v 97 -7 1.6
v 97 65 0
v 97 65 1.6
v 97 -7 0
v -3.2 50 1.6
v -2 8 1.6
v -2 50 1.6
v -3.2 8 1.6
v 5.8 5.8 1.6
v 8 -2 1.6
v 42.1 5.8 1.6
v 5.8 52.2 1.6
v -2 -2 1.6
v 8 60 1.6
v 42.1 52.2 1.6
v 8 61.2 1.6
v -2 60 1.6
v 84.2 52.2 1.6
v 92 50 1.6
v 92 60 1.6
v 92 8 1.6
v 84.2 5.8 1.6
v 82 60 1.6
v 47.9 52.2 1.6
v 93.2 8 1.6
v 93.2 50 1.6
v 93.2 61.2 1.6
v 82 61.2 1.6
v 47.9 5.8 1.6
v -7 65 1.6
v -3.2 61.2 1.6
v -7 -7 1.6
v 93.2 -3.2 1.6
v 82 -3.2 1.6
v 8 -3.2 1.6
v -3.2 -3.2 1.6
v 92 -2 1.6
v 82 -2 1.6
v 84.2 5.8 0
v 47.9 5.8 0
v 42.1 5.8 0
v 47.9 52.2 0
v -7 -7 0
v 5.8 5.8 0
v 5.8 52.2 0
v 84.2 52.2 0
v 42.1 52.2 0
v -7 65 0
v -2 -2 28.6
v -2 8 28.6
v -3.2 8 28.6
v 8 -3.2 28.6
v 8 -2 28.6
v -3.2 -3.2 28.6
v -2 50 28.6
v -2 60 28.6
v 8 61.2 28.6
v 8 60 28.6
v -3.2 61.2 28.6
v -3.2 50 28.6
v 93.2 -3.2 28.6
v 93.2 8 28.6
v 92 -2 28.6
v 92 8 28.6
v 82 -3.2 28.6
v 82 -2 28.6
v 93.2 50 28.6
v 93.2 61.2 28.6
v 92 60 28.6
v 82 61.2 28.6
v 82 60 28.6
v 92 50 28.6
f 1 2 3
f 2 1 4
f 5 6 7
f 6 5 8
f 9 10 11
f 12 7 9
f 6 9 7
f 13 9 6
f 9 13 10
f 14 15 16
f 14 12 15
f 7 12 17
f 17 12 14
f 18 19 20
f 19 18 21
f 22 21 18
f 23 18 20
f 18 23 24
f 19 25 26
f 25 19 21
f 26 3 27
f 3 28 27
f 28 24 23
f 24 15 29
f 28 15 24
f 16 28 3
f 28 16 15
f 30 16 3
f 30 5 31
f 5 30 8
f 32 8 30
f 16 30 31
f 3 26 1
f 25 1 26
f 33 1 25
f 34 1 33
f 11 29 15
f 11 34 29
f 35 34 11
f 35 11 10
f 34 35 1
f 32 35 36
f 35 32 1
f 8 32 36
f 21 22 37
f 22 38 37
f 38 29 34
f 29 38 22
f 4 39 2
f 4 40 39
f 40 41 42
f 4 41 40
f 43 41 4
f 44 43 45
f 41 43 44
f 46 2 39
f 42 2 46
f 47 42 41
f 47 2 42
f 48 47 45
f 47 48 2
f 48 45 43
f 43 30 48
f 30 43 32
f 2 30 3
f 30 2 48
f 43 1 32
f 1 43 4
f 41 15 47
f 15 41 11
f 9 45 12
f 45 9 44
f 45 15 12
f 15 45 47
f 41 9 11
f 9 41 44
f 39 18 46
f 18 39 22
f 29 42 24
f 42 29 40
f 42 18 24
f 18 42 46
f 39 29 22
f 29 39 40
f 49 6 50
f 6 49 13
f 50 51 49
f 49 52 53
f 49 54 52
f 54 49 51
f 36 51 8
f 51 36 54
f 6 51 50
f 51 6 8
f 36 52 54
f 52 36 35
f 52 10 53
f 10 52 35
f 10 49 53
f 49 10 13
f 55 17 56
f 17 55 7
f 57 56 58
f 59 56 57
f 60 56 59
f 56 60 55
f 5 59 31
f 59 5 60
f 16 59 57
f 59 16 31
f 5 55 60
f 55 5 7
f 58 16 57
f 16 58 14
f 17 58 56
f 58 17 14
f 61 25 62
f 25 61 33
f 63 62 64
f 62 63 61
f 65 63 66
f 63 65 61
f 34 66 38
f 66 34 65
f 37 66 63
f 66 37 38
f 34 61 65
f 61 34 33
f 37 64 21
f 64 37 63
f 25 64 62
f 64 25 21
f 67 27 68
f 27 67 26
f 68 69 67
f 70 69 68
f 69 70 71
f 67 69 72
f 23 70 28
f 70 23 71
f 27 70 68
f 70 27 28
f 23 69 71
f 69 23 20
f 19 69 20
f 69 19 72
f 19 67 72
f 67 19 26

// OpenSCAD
// Card Holder

// Card Length
CardLength = 90;

// Card Width
CardWidth = 58;

// Tolerance
Tolerance = 2;

// Size Of Nozzle
SizeOfNozzle = 0.4;

// Outside Skirt
OutsideSkirt = 5;

//Wall Thickness In Layers
WallThicknessInLayers = 3;

//Wall Height
WallHeight = 27;

//Wall Length
WallLength = 10;

//BottomThickness
BottomThickness = 1.6;

//Cut Out Percentage
CutOutPercentage = 80;



WallThickness = WallThicknessInLayers * SizeOfNozzle;
Rim = CardWidth * ((100 - CutOutPercentage) / 2) / 100;
CutOutLength = (CardLength - 3 * Rim) / 2;
CutOutWidth = CardWidth * CutOutPercentage / 100;


// Bottom Layer
difference(){
	translate([	0 - Tolerance - OutsideSkirt,
					0 - Tolerance - OutsideSkirt,
					0])
	cube(size = [	CardLength + 2 * (Tolerance + OutsideSkirt),
						CardWidth + 2 * (Tolerance + OutsideSkirt),
						BottomThickness]);

	// Cut Out
	translate([	0 + Rim,0 + Rim,0])
	cube(size = [	CutOutLength,
						CutOutWidth,
						BottomThickness]);

	translate([	0 + 2 * Rim + CutOutLength,0 + Rim,0])
	cube(size = [	CutOutLength,
						CutOutWidth,
						BottomThickness]);

}


// Walls(LL)

	translate([	0 - Tolerance - WallThickness,
					0 - Tolerance - WallThickness,
				   BottomThickness])
	cube(size = [	WallThickness,
						WallThickness + WallLength,
						WallHeight]);

	translate([	0 - Tolerance - WallThickness,
					0 - Tolerance - WallThickness,
				   BottomThickness])
	cube(size = [	WallThickness + WallLength,
						WallThickness,
						WallHeight]);


// Walls(UL)

	translate([	0 - Tolerance - WallThickness,
					CardWidth + Tolerance - WallLength,
				   BottomThickness])
	cube(size = [	WallThickness,
						WallThickness + WallLength,
						WallHeight]);

	translate([	0 - Tolerance - WallThickness,
					CardWidth + Tolerance,
				   BottomThickness])
	cube(size = [	WallThickness + WallLength,
						WallThickness,
						WallHeight]);

// Walls(LR)

	translate([	CardLength + Tolerance - WallLength,
					0 - Tolerance - WallThickness,
				   BottomThickness])
	cube(size = [	WallThickness + WallLength,
						WallThickness,
						WallHeight]);

	translate([	CardLength + Tolerance,
					0 - Tolerance - WallThickness,
				   BottomThickness])
	cube(size = [	WallThickness,
						WallThickness + WallLength,
						WallHeight]);

// Walls(UR)

	translate([	CardLength + Tolerance - WallLength,
					CardWidth + Tolerance,
				   BottomThickness])
	cube(size = [	WallThickness + WallLength,
						WallThickness,
						WallHeight]);

	translate([	CardLength + Tolerance,
					CardWidth + Tolerance - WallLength,
				   BottomThickness])
	cube(size = [	WallThickness,
						WallThickness + WallLength,
						WallHeight]);
